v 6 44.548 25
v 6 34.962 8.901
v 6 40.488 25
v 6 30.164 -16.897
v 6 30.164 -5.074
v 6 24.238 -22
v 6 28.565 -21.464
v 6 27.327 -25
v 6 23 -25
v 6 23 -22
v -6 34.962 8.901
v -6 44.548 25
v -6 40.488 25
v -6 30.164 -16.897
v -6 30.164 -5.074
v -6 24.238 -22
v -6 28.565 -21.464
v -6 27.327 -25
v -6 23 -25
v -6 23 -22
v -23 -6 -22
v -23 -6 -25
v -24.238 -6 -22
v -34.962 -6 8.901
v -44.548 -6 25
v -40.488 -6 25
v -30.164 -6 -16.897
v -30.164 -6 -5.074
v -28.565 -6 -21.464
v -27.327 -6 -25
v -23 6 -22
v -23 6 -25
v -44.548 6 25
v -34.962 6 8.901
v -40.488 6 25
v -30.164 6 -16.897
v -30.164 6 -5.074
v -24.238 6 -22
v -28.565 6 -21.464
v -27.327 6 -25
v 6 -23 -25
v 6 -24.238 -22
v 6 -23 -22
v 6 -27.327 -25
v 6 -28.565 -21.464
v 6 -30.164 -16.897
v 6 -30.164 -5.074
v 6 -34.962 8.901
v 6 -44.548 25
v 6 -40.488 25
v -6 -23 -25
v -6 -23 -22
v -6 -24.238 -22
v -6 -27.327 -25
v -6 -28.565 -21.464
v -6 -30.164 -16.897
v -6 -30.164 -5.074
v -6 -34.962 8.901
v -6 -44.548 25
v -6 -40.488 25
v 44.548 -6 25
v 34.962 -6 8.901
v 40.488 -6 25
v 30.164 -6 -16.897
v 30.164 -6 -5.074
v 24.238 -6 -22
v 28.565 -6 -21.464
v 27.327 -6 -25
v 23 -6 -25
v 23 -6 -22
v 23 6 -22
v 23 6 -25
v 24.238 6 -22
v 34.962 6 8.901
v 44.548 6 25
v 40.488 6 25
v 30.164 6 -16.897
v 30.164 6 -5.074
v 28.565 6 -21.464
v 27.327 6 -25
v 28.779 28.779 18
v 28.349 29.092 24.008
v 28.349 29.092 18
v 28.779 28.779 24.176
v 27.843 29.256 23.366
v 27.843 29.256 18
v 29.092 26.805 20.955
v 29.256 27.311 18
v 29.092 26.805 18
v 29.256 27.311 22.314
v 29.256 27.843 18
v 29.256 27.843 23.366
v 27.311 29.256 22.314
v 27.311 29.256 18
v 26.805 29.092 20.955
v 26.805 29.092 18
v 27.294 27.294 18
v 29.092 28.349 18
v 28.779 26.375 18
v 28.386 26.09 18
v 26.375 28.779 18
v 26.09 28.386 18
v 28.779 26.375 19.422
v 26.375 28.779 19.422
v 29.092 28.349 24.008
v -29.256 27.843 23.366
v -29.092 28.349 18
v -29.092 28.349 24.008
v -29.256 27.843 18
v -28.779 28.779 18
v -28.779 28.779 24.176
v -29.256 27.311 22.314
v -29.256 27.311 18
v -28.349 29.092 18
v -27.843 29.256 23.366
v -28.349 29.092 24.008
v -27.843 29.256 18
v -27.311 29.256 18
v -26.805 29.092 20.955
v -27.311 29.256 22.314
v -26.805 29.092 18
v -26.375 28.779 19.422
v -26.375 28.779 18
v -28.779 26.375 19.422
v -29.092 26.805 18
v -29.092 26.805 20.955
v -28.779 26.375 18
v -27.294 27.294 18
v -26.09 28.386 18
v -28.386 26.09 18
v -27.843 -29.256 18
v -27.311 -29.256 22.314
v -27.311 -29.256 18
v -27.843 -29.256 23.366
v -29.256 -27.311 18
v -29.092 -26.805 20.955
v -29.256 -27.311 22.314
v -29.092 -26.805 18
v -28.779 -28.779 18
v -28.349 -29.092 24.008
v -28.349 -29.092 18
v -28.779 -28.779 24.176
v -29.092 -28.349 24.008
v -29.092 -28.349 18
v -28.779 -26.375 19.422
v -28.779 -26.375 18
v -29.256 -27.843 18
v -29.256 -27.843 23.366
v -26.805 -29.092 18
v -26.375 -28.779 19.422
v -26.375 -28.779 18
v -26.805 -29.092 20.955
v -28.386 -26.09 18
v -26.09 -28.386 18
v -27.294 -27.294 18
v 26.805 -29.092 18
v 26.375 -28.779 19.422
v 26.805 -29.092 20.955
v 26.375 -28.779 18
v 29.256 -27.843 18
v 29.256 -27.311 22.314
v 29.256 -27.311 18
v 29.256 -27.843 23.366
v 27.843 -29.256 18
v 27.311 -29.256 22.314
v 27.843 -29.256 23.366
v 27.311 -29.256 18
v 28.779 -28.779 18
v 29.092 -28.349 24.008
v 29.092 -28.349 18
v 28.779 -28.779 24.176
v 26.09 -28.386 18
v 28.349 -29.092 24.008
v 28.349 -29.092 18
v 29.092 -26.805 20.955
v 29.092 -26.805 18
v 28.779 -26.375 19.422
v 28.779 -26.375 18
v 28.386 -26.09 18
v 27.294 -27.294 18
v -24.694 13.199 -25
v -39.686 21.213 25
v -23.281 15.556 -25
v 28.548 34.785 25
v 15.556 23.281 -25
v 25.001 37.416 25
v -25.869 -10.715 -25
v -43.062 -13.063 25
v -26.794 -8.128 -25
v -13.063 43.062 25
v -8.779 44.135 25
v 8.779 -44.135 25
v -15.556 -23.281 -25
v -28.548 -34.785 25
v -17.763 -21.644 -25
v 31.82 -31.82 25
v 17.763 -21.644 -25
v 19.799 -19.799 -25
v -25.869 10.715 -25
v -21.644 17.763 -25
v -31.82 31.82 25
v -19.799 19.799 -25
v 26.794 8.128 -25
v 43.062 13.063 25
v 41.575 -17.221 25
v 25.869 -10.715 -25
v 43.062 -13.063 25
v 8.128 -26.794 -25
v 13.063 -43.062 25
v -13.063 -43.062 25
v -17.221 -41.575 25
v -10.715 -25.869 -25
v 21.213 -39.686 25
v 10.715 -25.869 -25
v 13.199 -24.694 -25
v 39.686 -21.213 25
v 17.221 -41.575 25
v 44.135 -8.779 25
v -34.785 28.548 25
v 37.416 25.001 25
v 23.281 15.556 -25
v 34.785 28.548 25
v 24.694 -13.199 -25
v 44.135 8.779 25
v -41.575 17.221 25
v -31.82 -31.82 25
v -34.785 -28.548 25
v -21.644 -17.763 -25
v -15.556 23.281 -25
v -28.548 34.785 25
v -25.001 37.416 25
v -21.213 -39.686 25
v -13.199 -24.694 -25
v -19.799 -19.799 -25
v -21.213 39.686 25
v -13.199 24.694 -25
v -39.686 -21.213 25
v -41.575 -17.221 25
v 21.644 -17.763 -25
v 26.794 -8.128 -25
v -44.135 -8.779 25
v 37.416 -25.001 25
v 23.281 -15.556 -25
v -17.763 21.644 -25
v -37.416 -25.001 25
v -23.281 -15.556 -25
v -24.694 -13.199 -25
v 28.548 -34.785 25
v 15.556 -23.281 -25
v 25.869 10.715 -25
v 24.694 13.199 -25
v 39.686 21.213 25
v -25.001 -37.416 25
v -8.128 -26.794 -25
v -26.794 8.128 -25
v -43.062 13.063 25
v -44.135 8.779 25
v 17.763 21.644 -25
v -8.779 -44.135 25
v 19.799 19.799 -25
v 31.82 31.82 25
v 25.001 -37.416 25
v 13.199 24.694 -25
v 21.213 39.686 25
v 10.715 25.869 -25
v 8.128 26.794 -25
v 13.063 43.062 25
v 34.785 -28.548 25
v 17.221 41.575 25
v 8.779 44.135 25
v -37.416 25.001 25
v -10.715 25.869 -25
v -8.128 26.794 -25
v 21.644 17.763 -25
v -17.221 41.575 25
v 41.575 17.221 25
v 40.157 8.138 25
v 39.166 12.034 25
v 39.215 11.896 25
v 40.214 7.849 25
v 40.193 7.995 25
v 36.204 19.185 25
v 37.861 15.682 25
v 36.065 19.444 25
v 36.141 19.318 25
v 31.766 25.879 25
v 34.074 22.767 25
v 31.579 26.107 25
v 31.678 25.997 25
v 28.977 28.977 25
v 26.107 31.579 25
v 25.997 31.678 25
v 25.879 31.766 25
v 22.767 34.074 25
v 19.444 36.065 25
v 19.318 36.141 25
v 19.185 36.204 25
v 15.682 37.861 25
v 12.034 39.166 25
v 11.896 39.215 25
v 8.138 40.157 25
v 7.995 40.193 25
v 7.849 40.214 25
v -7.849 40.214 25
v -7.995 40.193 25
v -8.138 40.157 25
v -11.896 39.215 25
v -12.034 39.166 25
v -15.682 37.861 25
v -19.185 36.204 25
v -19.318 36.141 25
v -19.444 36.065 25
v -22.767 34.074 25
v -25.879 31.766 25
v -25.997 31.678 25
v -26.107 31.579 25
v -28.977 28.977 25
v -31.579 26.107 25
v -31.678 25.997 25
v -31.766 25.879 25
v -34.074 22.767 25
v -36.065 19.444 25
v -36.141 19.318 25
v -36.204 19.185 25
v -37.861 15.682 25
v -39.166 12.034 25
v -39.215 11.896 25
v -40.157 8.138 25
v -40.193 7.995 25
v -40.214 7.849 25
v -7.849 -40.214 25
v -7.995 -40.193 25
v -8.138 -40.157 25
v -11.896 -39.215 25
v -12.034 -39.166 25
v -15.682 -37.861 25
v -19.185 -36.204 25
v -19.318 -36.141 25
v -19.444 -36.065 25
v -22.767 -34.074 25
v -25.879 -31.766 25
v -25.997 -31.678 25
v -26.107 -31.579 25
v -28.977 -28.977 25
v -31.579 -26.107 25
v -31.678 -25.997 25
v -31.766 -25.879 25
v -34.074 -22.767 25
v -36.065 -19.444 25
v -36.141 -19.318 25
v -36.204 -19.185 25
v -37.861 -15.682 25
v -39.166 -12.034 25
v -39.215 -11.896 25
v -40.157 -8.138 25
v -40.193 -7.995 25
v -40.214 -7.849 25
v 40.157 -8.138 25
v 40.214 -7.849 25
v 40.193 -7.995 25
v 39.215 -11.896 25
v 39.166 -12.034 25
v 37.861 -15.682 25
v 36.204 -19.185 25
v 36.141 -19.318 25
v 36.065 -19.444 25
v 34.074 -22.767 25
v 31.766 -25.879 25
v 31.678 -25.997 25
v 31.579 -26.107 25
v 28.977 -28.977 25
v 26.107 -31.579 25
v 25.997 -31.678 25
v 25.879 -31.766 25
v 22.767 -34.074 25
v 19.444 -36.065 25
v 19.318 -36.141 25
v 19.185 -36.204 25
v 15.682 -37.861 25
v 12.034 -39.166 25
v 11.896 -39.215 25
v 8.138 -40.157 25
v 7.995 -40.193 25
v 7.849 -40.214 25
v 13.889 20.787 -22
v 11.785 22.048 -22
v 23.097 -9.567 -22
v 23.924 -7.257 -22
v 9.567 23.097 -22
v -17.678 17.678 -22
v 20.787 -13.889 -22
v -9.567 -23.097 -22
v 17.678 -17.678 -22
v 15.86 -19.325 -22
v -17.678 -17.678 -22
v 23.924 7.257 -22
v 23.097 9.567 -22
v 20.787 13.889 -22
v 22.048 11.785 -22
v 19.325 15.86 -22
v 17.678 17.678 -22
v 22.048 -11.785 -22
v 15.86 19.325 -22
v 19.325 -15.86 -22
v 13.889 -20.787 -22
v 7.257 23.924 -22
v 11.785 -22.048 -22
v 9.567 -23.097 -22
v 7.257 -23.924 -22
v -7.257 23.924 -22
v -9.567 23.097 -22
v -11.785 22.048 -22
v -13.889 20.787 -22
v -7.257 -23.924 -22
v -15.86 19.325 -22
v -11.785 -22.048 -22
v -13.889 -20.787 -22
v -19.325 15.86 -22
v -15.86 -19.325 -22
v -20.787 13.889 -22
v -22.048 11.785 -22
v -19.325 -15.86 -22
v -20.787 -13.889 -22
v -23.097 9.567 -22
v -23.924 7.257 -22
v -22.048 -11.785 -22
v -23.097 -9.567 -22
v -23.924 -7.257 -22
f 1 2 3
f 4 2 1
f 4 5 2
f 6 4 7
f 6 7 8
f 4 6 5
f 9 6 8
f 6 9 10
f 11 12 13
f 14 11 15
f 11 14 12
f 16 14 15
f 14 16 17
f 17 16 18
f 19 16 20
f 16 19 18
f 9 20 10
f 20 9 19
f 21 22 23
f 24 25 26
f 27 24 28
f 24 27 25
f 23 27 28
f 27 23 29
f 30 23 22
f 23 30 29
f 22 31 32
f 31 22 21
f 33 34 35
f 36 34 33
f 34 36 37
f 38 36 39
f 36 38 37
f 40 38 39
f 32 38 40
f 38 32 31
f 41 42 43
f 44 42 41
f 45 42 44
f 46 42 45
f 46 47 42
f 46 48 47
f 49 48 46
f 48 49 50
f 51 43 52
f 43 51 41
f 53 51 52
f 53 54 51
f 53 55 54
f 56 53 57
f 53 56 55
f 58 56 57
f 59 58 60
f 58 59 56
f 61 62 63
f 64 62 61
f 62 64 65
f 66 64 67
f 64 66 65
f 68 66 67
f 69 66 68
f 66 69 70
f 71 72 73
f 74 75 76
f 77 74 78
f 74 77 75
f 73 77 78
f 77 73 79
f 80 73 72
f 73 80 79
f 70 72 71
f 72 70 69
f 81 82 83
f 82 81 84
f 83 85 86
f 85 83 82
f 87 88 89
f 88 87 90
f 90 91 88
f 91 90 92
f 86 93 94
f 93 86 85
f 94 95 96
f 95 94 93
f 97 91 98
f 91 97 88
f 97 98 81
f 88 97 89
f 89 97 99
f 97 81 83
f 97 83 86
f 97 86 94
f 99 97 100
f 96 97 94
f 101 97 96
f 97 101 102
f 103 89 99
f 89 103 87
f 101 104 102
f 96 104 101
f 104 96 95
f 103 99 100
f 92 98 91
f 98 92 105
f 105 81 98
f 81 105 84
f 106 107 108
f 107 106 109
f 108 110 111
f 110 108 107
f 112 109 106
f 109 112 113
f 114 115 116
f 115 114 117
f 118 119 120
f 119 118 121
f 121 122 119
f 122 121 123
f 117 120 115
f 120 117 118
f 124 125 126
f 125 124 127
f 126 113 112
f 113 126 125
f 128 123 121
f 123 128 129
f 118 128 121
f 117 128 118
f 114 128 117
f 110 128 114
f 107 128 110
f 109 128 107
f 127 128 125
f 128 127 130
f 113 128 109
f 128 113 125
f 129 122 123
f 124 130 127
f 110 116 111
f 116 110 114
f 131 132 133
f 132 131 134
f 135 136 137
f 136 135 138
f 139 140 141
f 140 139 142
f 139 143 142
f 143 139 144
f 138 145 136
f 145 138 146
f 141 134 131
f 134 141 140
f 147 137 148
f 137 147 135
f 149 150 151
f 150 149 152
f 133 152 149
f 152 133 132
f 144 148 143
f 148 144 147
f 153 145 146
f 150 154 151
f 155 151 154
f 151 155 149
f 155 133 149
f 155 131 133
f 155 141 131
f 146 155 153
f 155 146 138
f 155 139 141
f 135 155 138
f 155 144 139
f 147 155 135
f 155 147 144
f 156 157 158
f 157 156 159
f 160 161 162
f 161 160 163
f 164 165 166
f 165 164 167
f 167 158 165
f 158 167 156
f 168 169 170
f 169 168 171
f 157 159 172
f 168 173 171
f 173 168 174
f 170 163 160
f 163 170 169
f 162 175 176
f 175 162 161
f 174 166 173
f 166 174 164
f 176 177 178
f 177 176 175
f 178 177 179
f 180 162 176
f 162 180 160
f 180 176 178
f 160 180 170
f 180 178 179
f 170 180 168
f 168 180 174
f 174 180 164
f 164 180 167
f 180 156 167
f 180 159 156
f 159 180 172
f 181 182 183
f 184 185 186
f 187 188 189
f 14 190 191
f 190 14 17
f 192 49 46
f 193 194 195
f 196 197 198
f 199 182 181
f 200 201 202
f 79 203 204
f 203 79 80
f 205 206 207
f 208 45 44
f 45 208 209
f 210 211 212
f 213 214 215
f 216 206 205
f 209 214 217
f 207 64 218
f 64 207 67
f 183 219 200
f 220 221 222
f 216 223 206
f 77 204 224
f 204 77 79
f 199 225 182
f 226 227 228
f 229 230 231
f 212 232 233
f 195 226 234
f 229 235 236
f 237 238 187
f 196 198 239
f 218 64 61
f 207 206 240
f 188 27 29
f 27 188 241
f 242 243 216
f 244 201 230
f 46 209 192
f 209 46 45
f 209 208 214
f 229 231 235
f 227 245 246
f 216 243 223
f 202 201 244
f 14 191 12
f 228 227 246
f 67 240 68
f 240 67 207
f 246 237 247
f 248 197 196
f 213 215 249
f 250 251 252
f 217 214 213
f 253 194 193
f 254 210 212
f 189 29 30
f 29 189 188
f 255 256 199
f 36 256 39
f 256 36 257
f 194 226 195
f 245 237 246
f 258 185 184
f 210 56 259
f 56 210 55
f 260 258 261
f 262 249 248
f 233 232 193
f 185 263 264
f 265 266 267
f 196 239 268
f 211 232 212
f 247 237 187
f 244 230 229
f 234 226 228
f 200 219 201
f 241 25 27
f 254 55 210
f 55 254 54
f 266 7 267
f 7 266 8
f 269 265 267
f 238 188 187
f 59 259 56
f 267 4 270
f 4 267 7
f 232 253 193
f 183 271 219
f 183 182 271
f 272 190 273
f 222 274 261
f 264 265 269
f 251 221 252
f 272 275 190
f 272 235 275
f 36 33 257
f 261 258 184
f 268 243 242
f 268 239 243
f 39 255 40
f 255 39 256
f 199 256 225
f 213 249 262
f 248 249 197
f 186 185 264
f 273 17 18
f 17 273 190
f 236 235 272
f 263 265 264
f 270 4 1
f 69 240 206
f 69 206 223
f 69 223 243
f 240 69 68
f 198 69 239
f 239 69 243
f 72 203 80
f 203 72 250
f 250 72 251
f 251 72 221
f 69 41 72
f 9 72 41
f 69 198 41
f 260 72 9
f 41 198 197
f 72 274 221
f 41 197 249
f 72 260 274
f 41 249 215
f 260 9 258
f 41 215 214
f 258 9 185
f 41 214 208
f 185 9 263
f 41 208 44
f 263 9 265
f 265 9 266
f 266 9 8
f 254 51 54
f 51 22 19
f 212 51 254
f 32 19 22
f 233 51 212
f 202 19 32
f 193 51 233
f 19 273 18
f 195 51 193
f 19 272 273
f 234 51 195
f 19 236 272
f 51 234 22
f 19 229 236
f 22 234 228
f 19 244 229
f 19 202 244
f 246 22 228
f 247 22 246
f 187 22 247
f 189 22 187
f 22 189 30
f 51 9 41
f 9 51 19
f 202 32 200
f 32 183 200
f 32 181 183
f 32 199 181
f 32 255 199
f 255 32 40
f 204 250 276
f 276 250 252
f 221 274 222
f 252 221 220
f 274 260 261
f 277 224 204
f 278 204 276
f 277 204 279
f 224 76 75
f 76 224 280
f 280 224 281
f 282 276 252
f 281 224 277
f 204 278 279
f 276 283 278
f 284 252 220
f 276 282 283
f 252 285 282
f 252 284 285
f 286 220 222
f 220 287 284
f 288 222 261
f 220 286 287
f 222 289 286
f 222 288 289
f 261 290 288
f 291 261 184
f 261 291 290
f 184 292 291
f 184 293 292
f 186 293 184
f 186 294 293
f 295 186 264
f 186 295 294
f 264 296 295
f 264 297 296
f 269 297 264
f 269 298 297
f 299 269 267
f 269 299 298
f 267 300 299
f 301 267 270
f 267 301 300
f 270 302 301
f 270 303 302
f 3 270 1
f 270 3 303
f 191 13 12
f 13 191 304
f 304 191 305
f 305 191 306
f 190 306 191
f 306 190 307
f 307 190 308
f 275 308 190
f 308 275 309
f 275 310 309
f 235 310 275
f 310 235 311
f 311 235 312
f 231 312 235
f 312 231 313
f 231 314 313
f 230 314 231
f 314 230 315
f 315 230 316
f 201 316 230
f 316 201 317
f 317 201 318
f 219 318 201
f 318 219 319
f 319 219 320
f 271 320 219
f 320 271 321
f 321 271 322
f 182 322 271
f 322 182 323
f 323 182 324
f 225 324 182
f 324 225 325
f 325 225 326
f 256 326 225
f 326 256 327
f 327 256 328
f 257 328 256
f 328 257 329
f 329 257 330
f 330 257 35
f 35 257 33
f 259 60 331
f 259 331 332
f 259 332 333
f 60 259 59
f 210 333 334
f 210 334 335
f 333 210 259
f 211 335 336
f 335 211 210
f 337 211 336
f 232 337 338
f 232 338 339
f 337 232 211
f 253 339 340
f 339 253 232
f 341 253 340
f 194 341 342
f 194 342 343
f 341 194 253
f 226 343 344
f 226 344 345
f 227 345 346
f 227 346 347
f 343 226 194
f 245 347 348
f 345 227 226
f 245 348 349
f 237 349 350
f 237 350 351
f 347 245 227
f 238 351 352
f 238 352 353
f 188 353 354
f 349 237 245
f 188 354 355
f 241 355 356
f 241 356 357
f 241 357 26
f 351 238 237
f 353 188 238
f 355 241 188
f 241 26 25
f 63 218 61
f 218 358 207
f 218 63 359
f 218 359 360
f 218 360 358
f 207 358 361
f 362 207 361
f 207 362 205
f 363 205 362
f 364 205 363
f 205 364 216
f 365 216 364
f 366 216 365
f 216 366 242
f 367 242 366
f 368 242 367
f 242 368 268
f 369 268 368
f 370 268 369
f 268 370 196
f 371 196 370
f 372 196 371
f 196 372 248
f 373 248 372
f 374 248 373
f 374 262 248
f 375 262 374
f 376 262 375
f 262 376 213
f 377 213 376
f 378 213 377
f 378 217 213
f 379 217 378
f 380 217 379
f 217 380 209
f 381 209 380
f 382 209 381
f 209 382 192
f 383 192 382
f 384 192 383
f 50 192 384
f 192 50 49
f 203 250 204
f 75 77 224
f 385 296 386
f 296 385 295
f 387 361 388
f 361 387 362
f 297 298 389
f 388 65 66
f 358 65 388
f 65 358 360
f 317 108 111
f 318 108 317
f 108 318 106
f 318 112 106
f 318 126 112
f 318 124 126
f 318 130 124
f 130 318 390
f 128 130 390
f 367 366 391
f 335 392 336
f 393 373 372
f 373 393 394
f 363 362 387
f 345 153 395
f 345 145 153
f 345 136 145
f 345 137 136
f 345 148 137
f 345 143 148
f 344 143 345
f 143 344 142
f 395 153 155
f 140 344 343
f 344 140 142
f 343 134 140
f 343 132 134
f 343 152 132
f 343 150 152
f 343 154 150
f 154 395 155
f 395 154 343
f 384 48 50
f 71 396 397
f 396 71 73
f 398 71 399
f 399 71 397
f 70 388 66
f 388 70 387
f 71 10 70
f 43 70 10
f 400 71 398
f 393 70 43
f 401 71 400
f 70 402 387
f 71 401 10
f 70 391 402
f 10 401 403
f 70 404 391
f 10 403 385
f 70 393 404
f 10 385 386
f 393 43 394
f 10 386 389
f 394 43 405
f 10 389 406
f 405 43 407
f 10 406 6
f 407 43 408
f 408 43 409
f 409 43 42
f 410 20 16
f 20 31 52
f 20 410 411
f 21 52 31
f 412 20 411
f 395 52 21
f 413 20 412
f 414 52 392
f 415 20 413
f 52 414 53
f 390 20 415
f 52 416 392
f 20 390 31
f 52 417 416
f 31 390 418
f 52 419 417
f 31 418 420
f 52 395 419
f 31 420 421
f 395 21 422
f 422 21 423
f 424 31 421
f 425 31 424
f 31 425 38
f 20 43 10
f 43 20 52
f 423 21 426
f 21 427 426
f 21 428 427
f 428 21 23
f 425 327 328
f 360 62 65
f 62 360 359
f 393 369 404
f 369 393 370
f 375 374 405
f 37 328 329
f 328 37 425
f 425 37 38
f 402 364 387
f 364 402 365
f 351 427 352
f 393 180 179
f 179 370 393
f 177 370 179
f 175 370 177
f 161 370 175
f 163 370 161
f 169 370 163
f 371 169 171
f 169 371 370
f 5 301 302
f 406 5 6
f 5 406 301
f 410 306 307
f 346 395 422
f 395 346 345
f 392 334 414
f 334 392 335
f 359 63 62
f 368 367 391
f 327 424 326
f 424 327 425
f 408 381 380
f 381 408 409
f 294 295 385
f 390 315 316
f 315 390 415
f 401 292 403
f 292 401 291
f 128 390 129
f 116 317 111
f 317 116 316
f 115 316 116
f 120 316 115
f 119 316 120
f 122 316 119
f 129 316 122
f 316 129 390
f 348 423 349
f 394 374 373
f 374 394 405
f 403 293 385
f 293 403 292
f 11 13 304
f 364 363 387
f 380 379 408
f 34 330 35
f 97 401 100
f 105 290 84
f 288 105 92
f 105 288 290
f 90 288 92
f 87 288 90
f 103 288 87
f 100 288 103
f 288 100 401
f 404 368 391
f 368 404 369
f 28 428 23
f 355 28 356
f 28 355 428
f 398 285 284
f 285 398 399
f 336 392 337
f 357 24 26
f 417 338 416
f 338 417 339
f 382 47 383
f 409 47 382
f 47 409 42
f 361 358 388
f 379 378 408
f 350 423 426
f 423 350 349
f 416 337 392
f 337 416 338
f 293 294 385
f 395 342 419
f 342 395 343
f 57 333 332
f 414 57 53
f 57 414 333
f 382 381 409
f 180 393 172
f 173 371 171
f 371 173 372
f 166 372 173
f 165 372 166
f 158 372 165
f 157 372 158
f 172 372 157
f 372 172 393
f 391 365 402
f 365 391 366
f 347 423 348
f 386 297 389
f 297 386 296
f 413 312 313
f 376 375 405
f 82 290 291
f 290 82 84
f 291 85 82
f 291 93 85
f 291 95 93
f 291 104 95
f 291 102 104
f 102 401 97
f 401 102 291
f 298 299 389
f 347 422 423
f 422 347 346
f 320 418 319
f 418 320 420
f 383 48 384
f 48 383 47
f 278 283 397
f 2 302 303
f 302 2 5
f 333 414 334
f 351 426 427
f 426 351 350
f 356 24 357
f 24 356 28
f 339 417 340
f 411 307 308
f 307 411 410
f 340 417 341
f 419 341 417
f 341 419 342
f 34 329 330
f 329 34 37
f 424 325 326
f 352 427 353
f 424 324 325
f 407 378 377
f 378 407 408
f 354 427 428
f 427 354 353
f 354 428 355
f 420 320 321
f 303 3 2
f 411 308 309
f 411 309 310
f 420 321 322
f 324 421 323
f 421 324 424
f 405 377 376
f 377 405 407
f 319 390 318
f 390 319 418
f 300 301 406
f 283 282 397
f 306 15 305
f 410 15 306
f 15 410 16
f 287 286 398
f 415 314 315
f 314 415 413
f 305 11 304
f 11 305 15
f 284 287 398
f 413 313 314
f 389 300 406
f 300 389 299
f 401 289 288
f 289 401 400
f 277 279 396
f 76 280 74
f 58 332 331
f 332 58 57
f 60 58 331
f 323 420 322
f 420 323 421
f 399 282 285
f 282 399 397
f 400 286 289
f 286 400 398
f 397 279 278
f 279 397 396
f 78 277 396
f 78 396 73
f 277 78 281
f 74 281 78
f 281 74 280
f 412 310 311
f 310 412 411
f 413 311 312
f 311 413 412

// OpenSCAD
// Parametric docking funnel for the MyZubster robot auto-recharge system.
// This funnel guides the robot into the charging contacts when it
// approaches the station from any angle. Issue #85 task: Navigazione
// verso colonnina di ricarica + Connessione automatica.
// Print in PETG, 30% infill for flexibility.

// Parameters (mm)
funnel_top_d = 90;
funnel_bottom_d = 56;
funnel_h = 50;
wall_t = 3;
slot_w = 12;
slot_count = 4;
bolt_dia = 3.4;
$fn = 64;

module docking_funnel() {
  difference() {
    // outer cone
    cylinder(h = funnel_h, d1 = funnel_bottom_d, d2 = funnel_top_d, center = true);
    // inner cone (hollow)
    translate([0, 0, wall_t])
      cylinder(h = funnel_h, d1 = funnel_bottom_d - wall_t * 2, d2 = funnel_top_d - wall_t * 2, center = true);
    // alignment slots (guide fins that center the robot)
    for (i = [0 : slot_count - 1])
      rotate([0, 0, i * (360 / slot_count)])
        translate([0, (funnel_bottom_d + funnel_top_d) / 4, 0])
          cube([slot_w, (funnel_top_d - funnel_bottom_d) / 2 + 10, funnel_h + 2], center = true);
    // mount holes
    for (i = [0 : 3])
      rotate([0, 0, 45 + i * 90])
        translate([funnel_top_d / 2 - 6, 0, funnel_h / 2 - 3])
          cylinder(h = 8, d = bolt_dia, $fn = 20, center = true);
  }
}

docking_funnel();
